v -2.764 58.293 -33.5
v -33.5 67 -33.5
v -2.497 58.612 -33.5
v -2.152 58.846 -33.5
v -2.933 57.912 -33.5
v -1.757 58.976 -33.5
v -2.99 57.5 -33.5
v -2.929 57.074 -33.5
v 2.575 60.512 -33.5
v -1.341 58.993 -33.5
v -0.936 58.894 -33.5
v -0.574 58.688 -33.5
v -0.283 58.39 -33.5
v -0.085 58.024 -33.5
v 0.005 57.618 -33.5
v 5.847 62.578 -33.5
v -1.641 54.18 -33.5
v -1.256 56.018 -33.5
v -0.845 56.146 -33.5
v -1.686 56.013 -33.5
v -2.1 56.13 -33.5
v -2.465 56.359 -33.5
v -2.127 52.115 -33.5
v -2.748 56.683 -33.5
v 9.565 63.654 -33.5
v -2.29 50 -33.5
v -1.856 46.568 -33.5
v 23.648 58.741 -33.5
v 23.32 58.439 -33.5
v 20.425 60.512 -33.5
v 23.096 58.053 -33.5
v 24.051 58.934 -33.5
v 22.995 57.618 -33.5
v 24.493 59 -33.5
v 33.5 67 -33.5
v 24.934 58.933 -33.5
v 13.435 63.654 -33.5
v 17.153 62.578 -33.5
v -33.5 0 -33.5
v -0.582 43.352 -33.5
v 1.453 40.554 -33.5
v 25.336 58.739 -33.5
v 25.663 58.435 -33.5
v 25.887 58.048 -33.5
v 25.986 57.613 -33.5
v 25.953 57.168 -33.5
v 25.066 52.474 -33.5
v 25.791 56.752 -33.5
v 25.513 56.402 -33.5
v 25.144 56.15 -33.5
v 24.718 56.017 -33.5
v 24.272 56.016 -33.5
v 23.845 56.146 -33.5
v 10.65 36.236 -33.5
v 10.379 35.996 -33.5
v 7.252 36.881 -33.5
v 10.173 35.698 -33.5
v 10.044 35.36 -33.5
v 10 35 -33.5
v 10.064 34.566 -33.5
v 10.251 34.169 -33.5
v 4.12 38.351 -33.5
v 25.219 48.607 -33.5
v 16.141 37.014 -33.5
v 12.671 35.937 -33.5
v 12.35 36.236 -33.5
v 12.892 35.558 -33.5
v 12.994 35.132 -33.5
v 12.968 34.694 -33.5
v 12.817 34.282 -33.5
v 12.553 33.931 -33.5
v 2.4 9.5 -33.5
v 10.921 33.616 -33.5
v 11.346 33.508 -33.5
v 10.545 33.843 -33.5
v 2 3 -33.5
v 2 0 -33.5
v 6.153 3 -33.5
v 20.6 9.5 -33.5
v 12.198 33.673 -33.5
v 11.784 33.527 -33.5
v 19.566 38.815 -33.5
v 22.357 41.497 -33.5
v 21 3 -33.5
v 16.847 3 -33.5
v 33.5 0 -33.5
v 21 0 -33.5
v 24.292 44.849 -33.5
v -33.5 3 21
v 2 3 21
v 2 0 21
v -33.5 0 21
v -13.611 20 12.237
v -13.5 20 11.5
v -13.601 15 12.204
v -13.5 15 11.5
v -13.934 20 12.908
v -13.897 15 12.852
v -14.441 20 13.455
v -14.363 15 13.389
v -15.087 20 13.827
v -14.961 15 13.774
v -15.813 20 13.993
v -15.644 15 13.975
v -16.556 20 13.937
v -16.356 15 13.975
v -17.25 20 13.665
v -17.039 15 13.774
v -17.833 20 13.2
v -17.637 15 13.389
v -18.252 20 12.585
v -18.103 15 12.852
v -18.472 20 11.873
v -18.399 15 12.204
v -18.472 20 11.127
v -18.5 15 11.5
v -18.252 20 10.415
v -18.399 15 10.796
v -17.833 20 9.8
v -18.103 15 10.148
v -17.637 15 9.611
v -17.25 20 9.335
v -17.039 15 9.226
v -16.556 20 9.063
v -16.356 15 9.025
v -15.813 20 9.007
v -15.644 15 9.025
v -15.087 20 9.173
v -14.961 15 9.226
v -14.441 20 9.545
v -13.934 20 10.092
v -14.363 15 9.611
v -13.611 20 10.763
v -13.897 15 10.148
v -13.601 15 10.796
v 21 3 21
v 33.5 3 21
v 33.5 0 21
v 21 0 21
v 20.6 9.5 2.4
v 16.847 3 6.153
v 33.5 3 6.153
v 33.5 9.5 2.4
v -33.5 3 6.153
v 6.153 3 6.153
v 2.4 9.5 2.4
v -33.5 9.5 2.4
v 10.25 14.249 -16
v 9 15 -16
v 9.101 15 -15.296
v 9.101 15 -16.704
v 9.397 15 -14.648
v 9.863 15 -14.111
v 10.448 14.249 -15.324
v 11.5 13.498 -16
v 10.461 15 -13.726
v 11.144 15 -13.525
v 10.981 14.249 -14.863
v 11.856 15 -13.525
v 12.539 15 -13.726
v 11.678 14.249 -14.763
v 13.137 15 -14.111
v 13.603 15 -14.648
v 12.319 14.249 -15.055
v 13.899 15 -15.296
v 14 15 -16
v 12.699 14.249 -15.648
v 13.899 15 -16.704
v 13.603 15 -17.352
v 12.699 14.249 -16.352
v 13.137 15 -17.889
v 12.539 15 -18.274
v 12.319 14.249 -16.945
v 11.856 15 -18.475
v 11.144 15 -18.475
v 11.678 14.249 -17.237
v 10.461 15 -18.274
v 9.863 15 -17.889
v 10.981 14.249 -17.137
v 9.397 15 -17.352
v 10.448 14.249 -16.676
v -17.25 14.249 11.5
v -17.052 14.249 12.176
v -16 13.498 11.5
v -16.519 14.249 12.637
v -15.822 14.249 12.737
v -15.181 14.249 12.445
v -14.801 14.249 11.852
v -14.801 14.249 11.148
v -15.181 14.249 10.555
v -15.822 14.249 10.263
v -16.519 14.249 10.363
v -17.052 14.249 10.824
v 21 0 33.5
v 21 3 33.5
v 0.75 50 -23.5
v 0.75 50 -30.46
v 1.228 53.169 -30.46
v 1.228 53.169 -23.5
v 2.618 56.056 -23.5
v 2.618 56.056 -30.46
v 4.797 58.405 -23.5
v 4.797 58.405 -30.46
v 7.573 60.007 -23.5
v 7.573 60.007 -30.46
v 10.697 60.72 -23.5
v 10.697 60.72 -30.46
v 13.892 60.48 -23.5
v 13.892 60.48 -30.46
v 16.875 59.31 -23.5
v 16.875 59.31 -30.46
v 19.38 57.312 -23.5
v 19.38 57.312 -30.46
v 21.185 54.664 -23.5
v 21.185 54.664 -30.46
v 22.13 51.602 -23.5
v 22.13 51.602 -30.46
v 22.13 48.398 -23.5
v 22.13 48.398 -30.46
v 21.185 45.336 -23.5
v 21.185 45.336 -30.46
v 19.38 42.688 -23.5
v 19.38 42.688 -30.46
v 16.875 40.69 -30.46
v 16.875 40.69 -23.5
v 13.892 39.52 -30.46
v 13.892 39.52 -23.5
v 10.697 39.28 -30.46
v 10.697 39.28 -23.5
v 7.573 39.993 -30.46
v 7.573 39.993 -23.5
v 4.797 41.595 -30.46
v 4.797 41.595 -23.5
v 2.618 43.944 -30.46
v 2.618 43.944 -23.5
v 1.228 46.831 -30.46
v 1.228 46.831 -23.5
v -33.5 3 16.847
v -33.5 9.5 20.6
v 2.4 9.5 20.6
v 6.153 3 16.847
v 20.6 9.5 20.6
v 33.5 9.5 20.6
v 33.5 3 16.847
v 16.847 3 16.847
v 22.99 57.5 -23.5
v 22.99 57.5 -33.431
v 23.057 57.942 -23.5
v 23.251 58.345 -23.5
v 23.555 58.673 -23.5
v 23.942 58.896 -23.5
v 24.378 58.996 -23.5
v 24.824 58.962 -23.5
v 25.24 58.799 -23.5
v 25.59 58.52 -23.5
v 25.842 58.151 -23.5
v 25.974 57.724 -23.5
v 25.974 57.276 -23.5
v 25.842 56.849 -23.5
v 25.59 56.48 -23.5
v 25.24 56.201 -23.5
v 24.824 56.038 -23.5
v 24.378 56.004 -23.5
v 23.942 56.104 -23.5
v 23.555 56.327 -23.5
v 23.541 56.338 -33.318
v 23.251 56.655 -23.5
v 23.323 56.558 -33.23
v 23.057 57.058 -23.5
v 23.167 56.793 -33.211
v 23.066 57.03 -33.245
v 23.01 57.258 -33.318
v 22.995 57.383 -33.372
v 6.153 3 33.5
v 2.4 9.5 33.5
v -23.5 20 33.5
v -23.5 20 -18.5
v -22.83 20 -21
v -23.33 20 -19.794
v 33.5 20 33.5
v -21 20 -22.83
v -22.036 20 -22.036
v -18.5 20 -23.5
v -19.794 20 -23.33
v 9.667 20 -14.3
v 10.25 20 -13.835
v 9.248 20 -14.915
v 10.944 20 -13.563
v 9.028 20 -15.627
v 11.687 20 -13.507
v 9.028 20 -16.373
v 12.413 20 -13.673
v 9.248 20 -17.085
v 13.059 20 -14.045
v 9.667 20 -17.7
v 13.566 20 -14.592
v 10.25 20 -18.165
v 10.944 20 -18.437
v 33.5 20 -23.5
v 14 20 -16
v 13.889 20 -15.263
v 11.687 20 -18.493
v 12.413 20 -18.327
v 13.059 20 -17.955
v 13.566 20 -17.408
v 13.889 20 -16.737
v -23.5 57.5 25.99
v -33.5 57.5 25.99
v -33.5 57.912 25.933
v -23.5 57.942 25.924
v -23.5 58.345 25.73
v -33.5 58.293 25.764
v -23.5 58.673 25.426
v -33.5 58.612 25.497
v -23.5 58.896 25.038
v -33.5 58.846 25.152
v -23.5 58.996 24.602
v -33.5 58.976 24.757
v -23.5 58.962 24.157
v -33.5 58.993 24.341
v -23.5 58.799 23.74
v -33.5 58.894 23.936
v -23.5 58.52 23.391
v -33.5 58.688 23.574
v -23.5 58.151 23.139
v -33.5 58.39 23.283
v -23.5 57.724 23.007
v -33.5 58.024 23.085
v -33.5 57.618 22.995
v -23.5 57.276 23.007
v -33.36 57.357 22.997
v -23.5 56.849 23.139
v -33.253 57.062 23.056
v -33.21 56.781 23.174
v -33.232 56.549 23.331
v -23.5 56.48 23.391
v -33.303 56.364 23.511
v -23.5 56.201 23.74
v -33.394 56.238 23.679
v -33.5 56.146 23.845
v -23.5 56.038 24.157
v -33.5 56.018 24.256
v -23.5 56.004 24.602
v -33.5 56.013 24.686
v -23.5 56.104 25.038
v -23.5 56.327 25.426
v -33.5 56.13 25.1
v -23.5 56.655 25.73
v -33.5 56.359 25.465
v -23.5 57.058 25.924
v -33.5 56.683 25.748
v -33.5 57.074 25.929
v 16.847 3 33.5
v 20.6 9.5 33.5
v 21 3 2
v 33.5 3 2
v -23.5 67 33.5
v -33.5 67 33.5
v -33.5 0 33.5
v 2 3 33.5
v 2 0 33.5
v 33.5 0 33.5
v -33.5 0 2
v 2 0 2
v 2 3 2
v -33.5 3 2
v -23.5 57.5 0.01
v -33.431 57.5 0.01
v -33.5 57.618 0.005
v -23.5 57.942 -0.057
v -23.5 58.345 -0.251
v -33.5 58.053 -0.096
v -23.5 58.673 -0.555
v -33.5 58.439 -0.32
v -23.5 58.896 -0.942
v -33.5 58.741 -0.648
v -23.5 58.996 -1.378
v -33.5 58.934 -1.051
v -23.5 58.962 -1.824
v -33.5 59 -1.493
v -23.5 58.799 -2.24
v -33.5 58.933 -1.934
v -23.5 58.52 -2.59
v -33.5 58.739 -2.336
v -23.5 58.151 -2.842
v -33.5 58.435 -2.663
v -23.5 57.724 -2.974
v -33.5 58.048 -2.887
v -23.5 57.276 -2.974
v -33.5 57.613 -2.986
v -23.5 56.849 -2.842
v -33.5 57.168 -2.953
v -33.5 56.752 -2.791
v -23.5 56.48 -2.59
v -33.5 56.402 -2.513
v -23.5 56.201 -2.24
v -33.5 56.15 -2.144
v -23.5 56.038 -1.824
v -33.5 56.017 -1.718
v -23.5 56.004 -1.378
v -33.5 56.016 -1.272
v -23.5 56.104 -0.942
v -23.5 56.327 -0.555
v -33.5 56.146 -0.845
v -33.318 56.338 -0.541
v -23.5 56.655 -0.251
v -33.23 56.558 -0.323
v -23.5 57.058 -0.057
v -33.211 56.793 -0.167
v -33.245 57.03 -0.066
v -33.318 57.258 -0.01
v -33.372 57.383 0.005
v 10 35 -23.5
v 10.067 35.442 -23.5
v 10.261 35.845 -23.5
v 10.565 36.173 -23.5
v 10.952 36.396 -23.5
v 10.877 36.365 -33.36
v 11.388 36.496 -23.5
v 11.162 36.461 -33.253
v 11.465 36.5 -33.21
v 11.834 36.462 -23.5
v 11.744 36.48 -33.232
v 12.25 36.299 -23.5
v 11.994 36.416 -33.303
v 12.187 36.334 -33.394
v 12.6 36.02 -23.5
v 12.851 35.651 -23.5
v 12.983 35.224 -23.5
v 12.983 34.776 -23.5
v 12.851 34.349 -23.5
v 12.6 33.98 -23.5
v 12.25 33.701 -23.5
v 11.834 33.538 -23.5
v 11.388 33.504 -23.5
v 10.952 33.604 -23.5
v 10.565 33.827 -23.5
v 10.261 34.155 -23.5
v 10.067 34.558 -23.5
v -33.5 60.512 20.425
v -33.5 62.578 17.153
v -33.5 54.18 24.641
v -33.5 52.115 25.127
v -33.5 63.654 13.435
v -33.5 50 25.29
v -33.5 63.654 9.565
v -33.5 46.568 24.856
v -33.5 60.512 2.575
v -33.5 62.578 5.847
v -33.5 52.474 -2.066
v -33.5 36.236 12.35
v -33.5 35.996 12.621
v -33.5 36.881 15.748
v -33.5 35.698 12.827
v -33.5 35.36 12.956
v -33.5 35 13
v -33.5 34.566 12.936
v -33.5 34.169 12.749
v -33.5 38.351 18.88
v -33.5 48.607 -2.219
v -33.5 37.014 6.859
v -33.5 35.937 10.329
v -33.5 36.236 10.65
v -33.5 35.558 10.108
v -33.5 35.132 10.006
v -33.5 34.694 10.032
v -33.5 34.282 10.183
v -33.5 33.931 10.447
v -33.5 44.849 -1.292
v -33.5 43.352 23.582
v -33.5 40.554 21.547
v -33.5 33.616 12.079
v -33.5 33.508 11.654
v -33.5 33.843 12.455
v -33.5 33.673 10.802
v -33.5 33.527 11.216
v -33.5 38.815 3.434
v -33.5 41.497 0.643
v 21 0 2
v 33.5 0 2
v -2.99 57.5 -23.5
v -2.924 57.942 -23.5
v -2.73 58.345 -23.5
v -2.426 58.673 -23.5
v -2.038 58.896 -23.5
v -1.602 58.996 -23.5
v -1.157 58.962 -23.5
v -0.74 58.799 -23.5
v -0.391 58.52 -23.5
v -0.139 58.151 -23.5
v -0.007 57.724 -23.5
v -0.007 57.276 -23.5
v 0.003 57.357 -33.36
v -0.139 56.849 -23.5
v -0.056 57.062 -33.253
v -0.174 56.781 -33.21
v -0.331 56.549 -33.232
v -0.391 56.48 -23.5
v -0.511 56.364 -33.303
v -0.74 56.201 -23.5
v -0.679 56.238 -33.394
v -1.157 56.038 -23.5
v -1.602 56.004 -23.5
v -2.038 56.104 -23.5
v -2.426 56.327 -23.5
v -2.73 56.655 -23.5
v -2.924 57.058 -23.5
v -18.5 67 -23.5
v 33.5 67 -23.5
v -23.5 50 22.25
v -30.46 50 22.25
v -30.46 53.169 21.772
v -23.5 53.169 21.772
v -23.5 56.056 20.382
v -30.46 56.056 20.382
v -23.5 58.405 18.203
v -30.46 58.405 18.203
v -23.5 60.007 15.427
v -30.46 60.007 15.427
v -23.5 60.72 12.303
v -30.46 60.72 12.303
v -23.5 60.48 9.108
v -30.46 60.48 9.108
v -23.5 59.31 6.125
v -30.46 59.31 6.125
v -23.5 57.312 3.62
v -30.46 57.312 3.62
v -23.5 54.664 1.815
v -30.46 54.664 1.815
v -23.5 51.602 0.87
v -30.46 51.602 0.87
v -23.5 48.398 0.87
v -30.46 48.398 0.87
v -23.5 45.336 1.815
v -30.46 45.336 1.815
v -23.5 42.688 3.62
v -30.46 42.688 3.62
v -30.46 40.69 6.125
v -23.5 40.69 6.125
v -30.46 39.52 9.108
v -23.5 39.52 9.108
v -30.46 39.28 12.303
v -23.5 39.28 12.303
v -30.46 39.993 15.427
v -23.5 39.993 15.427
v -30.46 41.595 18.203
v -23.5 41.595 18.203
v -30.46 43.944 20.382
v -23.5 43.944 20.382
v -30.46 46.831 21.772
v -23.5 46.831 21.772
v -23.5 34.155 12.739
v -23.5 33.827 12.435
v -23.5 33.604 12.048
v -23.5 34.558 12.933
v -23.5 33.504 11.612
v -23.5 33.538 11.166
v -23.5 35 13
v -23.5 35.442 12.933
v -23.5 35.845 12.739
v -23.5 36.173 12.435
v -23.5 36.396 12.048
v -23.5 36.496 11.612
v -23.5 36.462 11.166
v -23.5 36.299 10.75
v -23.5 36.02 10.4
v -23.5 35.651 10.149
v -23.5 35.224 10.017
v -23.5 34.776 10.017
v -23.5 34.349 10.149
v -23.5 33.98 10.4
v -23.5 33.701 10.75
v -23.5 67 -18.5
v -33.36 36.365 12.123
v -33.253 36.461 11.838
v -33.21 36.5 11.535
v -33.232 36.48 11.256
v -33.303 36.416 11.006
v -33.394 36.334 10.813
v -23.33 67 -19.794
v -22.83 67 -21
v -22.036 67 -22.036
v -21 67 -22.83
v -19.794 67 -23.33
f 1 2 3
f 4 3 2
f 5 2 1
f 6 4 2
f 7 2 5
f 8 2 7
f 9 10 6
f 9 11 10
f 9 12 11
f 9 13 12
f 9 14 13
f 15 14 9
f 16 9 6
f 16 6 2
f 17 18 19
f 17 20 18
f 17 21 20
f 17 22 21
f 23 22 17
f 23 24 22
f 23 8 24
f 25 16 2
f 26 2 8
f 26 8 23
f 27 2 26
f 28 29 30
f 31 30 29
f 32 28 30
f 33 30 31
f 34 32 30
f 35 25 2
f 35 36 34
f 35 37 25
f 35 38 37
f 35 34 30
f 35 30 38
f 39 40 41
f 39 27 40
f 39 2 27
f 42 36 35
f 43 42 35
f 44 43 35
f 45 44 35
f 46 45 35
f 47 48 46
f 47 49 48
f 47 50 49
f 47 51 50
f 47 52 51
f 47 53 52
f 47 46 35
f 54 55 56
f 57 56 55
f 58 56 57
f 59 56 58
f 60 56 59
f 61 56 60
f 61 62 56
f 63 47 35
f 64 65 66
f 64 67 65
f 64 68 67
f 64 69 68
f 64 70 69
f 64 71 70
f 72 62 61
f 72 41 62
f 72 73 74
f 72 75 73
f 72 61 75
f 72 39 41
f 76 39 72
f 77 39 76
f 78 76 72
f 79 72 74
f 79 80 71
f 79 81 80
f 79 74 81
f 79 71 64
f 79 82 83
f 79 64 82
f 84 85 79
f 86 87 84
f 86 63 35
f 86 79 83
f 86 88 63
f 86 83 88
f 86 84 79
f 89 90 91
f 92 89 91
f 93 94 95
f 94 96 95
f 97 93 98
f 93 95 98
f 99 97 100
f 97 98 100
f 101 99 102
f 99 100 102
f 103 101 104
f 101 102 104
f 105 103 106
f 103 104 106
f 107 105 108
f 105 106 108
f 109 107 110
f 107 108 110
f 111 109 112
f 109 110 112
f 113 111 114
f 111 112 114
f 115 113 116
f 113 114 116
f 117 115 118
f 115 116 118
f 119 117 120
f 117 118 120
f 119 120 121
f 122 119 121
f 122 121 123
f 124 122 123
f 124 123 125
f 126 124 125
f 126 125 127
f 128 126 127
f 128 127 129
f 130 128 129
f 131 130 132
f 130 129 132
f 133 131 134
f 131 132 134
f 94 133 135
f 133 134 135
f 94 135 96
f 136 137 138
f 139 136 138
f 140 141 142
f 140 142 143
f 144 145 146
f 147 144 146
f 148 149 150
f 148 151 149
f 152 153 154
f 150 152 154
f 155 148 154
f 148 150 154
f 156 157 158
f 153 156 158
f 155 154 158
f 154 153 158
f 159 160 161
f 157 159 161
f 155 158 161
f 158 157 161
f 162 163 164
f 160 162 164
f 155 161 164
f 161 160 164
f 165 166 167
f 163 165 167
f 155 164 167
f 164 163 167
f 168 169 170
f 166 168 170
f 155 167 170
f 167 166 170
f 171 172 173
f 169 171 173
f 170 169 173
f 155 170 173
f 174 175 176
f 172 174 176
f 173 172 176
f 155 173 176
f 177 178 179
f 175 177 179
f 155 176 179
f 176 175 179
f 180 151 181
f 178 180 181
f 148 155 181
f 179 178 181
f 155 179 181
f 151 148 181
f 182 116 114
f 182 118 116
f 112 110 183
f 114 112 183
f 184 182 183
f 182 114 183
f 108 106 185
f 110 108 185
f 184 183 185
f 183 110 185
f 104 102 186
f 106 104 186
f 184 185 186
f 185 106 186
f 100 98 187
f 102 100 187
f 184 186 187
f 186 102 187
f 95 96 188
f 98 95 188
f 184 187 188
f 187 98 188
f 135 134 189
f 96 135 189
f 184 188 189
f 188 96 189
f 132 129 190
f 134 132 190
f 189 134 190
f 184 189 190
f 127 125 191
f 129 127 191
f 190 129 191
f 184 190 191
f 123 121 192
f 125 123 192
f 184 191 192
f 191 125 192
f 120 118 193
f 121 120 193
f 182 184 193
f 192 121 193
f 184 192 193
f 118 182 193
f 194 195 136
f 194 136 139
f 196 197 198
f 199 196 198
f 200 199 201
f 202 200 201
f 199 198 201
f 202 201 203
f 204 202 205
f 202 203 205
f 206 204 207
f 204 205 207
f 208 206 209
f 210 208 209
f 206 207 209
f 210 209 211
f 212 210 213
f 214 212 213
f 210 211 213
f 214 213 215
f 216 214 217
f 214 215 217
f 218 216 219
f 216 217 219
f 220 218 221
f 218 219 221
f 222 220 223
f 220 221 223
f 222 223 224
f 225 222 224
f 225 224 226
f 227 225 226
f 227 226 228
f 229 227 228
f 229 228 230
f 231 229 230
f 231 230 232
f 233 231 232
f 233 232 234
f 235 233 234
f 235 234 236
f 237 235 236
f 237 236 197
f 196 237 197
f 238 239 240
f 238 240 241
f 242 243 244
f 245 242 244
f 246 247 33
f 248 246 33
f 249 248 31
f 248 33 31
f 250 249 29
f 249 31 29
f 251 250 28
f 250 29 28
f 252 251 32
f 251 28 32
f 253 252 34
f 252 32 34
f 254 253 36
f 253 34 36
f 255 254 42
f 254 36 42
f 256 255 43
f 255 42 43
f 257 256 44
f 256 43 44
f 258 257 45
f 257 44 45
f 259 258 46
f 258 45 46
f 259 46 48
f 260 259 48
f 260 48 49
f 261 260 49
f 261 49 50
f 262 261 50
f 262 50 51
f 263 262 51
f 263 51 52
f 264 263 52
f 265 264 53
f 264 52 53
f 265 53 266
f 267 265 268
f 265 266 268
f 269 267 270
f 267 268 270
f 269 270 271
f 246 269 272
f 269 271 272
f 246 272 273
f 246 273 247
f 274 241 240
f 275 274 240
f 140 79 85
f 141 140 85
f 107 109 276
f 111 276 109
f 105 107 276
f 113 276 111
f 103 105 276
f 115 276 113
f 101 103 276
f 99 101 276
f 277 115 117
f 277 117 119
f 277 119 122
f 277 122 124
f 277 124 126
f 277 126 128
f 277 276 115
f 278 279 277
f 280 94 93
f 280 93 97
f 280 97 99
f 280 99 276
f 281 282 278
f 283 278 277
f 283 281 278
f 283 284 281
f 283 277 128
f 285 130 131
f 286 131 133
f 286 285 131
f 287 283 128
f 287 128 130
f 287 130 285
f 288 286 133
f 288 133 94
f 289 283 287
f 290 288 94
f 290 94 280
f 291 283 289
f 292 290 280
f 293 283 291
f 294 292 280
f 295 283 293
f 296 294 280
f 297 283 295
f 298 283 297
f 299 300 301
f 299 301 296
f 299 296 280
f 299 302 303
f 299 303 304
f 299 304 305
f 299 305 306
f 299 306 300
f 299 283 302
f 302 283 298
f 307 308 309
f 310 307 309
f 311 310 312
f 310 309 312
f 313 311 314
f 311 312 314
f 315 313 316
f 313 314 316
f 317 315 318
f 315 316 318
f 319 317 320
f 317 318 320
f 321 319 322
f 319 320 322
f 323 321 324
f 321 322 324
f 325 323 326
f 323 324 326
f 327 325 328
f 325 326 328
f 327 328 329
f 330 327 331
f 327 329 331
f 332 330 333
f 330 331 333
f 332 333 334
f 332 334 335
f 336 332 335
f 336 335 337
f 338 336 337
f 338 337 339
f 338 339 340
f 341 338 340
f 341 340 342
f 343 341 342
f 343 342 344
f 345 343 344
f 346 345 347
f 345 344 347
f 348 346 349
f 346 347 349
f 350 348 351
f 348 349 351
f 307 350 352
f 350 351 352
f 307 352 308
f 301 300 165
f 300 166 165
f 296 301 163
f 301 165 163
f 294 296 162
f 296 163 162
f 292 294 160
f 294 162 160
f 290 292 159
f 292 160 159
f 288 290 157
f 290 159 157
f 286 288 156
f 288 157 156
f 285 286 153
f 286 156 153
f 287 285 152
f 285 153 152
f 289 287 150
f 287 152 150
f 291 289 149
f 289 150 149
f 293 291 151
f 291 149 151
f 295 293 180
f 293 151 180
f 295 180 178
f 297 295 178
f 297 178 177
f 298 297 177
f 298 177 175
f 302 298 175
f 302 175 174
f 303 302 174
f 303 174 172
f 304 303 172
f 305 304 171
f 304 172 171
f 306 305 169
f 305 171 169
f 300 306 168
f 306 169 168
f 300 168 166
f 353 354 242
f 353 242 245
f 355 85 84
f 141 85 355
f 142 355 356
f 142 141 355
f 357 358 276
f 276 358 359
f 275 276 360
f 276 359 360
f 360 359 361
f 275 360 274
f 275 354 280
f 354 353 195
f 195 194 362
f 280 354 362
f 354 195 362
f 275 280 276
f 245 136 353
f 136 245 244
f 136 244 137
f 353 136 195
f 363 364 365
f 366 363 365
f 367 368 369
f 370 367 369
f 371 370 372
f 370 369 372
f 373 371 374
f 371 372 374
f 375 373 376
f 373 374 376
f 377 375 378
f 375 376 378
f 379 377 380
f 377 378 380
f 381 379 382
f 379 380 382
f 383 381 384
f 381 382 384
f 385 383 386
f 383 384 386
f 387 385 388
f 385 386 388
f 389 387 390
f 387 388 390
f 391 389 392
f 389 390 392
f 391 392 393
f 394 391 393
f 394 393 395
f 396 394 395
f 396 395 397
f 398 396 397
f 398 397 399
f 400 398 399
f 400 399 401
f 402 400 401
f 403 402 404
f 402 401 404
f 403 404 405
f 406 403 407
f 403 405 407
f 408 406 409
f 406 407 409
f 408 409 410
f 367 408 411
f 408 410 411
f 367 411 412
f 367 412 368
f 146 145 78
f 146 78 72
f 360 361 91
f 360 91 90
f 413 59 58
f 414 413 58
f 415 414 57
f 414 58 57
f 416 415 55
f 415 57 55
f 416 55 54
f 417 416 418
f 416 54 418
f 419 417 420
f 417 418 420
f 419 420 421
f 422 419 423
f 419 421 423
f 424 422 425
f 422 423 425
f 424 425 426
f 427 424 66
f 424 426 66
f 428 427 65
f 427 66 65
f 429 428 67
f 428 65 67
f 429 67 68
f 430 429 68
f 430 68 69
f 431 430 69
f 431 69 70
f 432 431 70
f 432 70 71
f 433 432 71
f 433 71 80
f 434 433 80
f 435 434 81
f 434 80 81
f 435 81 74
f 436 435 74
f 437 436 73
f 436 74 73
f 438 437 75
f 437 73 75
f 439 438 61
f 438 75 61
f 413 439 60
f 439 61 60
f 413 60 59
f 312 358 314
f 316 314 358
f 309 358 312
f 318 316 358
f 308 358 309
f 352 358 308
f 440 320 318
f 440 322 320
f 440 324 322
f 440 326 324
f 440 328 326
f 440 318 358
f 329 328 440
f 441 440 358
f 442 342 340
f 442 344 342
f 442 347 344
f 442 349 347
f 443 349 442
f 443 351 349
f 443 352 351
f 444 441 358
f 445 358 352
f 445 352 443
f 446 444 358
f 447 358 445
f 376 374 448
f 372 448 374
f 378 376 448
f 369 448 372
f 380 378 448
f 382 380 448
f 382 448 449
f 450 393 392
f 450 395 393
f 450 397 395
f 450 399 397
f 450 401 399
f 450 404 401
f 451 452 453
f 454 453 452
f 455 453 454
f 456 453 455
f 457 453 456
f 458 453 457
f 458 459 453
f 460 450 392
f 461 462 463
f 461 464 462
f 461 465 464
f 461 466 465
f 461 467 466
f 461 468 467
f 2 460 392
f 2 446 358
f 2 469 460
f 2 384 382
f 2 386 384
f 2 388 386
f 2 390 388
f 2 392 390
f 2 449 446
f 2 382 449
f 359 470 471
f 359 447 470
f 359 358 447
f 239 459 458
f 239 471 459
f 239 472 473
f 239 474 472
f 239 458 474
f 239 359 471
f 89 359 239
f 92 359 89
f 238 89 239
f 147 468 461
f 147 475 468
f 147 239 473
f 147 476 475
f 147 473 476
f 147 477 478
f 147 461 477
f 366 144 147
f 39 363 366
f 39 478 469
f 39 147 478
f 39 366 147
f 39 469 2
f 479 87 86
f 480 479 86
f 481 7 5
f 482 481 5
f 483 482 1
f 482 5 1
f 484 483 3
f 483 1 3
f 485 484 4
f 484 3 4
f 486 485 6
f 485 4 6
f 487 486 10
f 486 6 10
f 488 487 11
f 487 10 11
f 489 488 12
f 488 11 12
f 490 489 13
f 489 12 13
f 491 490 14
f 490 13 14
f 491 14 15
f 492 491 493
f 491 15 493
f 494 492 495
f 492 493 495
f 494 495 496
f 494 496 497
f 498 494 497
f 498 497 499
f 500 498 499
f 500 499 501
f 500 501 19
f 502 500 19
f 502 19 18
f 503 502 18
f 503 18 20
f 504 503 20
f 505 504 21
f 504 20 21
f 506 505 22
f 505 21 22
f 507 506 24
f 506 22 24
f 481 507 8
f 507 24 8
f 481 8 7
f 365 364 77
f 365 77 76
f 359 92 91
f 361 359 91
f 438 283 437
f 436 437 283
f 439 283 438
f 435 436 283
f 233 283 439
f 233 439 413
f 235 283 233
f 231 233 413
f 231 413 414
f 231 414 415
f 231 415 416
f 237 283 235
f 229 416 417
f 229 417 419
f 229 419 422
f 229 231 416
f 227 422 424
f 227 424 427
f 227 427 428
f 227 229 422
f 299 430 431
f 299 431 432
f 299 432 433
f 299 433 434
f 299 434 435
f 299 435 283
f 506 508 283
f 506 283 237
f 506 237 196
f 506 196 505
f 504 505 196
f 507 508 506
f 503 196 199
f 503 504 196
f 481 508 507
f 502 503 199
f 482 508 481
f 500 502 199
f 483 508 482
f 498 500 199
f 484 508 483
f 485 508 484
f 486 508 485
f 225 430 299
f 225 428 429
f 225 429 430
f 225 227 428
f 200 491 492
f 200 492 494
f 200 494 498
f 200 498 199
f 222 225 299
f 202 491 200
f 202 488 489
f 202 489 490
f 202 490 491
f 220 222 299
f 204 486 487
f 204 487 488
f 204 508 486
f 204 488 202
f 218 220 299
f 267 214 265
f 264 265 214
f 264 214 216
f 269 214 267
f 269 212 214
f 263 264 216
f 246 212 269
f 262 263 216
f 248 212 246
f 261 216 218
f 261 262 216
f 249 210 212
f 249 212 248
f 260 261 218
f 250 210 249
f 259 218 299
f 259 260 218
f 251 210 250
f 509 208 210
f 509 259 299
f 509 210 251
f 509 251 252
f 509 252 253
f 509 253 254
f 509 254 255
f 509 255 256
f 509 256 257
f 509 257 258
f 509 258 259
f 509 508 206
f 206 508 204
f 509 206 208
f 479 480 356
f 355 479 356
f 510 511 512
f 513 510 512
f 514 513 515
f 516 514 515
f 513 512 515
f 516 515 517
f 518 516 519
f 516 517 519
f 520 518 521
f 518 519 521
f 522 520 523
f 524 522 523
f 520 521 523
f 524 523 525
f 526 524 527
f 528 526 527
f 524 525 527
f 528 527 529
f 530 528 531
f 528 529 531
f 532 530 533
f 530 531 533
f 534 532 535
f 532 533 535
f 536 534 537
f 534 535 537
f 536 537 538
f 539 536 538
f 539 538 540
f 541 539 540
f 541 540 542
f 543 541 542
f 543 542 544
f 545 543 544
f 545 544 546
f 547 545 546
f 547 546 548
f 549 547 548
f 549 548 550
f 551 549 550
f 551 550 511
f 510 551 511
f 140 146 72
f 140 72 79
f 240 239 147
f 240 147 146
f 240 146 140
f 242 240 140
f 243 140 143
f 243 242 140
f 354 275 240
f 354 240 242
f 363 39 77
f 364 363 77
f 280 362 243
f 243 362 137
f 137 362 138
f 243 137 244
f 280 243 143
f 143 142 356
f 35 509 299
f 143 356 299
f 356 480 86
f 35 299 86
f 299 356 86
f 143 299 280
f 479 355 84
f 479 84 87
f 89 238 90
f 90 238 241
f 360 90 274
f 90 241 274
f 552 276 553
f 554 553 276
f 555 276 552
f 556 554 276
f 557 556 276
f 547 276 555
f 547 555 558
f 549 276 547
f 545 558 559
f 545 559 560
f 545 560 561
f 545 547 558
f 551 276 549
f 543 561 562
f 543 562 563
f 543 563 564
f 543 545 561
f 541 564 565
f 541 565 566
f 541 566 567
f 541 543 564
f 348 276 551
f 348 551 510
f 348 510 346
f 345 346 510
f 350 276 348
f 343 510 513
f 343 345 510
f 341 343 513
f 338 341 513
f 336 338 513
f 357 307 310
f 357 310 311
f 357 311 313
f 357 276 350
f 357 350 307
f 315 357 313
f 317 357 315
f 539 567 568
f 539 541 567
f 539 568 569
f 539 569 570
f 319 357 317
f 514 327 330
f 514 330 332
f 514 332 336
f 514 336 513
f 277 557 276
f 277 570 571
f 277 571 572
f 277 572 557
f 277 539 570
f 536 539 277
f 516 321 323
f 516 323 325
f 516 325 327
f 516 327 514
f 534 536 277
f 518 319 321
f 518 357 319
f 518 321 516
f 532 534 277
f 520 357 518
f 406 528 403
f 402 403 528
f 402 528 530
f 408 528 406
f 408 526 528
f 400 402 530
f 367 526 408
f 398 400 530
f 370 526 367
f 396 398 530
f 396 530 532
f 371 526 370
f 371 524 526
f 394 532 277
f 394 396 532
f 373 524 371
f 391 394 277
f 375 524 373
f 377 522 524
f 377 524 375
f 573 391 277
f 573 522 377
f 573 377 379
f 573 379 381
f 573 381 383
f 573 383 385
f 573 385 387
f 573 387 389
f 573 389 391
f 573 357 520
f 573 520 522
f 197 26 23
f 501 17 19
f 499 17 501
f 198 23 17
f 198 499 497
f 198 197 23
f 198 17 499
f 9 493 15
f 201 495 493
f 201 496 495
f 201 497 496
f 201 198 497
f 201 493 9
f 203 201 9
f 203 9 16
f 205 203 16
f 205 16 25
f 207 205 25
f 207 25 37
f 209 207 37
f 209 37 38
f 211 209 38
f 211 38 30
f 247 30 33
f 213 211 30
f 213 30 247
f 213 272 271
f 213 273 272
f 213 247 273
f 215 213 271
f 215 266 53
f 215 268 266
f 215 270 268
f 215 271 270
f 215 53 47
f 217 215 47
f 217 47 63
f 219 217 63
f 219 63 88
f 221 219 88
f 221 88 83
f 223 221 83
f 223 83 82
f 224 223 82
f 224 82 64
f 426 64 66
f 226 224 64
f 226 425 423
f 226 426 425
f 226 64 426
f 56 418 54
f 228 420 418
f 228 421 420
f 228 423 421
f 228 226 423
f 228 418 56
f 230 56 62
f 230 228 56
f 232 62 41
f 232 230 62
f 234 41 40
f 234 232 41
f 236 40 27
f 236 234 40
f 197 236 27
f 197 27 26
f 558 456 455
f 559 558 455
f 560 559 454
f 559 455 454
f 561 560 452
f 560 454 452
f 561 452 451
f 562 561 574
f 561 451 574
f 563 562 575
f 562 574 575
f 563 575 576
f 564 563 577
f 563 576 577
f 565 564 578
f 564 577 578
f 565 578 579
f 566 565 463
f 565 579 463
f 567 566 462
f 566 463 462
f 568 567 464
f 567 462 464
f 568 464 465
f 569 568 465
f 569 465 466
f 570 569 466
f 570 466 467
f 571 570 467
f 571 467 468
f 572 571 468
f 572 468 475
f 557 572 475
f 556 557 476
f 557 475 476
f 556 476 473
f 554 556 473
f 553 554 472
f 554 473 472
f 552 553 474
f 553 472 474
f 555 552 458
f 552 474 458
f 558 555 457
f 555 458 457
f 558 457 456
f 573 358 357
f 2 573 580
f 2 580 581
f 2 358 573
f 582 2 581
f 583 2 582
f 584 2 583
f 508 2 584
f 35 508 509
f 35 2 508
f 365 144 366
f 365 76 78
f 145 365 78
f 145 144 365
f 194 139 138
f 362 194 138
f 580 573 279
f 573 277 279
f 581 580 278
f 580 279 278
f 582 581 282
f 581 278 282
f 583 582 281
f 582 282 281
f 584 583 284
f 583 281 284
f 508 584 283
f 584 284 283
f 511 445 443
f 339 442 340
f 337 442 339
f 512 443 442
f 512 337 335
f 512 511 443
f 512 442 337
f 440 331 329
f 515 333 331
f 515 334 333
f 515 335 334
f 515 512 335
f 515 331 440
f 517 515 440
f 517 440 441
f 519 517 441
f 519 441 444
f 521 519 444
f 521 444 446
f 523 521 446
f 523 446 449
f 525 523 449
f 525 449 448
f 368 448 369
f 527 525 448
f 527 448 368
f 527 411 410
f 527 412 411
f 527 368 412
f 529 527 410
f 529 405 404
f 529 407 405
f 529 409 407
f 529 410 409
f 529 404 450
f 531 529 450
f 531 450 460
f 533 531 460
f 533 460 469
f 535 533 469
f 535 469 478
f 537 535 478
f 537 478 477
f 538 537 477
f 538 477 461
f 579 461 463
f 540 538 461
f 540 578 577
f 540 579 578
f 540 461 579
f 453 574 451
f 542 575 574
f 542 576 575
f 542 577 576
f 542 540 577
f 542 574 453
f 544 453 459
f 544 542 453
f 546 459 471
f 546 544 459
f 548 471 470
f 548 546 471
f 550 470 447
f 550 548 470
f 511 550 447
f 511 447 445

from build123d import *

# Parameters (mm, degrees)
SKETCH1_W                    = 67
SKETCH1_H                    = 67
BOSS_EXTRUDE1_DEPTH          = 67
SKETCH2_W                    = 57
SKETCH2_H                    = 57
CUT_EXTRUDE1_DEPTH           = 47
CUT_EXTRUDE2_REACH           = 102.5
SKETCH3_R                    = 10.75
CUT_EXTRUDE3_REACH           = 102.5
SKETCH4_R                    = 10.75
F_5_0_5_DIAMETER_HOLE1_D     = 5
F_5_0_5_DIAMETER_HOLE1_DEPTH = 5
F_5_0_5_DIAMETER_HOLE1_TIP   = 1.502151548
FILLET1_R                    = 5
CHAMFER1_SIZE                = 3.04
CUT_EXTRUDE4_REACH           = 102.5
CUT_EXTRUDE5_DEPTH           = 101.5
SKETCH9_R                    = 1.5
CUT_EXTRUDE6_DEPTH           = 10
SKETCH10_R                   = 1.5
CUT_EXTRUDE7_DEPTH           = 10


with BuildPart() as part:
    # Sketch1 → Boss-Extrude1 (new body)
    with BuildSketch(Plane(origin=(0, 0, 0), x_dir=(1, 0, 0), z_dir=(0, 1, 0))):
        Rectangle(SKETCH1_W, SKETCH1_H)
    extrude(amount=BOSS_EXTRUDE1_DEPTH)

    # Sketch2 → Cut-Extrude1 (cut)
    with BuildSketch(Plane(origin=(0, 67, 0), x_dir=(1, 0, 0), z_dir=(0, 1, 0))):
        with Locations((5, -5)):
            Rectangle(SKETCH2_W, SKETCH2_H)
    extrude(amount=-CUT_EXTRUDE1_DEPTH, mode=Mode.SUBTRACT)

    # Sketch3 → Cut-Extrude2 (cut, up to next)
    with BuildSketch(Plane.ZY.offset(33.5), mode=Mode.PRIVATE) as cut_extrude2_sk1:
        with Locations((11.5, 50)):
            Circle(SKETCH3_R)
    cut_extrude2_tool1 = extrude(cut_extrude2_sk1.sketch, amount=-CUT_EXTRUDE2_REACH, mode=Mode.PRIVATE) & part.part
    add(cut_extrude2_tool1.solids().sort_by_distance((-33.5, 50, 11.5))[0], mode=Mode.SUBTRACT)

    # Sketch4 → Cut-Extrude3 (cut, up to next)
    with BuildSketch(Plane(origin=(0, 0, -33.5), x_dir=(-1, 0, 0), z_dir=(0, 0, -1)), mode=Mode.PRIVATE) as cut_extrude3_sk1:
        with Locations((-11.5, 50)):
            Circle(SKETCH4_R)
    cut_extrude3_tool1 = extrude(cut_extrude3_sk1.sketch, amount=-CUT_EXTRUDE3_REACH, mode=Mode.PRIVATE) & part.part
    add(cut_extrude3_tool1.solids().sort_by_distance((11.5, 50, -33.5))[0], mode=Mode.SUBTRACT)

    # Ø5.0 (5) Diameter Hole1
    with Locations(Plane(origin=(0, 20, 0), x_dir=(-1, 0, 0), z_dir=(0, 1, 0))):
        with Locations((16, 11.5), (-11.5, -16)):
            Hole(F_5_0_5_DIAMETER_HOLE1_D / 2, depth=F_5_0_5_DIAMETER_HOLE1_DEPTH)
            with Locations((0, 0, -(F_5_0_5_DIAMETER_HOLE1_DEPTH + F_5_0_5_DIAMETER_HOLE1_TIP / 2))):  # 118° drill point
                Cone(0, F_5_0_5_DIAMETER_HOLE1_D / 2, F_5_0_5_DIAMETER_HOLE1_TIP, mode=Mode.SUBTRACT)

    # Fillet1
    fillet1_edges = [part.edges().sort_by_distance(p)[0] for p in [
        (-23.5, 43.5, -23.5),
    ]]
    fillet(fillet1_edges, radius=FILLET1_R)

    # Chamfer1
    chamfer1_edges = [part.edges().sort_by_distance(p)[0] for p in [
        (-33.5, 50, 0.75),
        (22.25, 50, -33.5),
    ]]
    chamfer(chamfer1_edges, length=CHAMFER1_SIZE)

    # Sketch7 → Cut-Extrude4 (cut, up to next)
    with BuildSketch(Plane(origin=(33.5, 0, 0), x_dir=(0, 0, -1), z_dir=(1, 0, 0)), mode=Mode.PRIVATE) as cut_extrude4_sk1:
        Polygon((-2.4, 9.5), (-20.6, 9.5), (-16.84722325, 3), (-21, 3), (-21, 0), (-2, 0), (-2, 3), (-6.15277675, 3), align=None)
    cut_extrude4_tool1 = extrude(cut_extrude4_sk1.sketch, amount=-CUT_EXTRUDE4_REACH, mode=Mode.PRIVATE) & part.part
    add(cut_extrude4_tool1.solids().sort_by_distance((33.5, 4.630961, 11.5))[0], mode=Mode.SUBTRACT)

    # Sketch8 → Cut-Extrude5 (cut, through all)
    with BuildSketch(Plane.XY.offset(33.5)):
        Polygon((2.4, 9.5), (20.6, 9.5), (16.84722325, 3), (21, 3), (21, 0), (2, 0), (2, 3), (6.15277675, 3), align=None)
    extrude(amount=-CUT_EXTRUDE5_DEPTH, mode=Mode.SUBTRACT)

    # Sketch9 → Cut-Extrude6 (cut)
    with BuildSketch(Plane.ZY.offset(33.5)):
        with Locations((-1.490381057, 57.5)):
            Circle(SKETCH9_R)
        with Locations((24.490381057, 57.5)):
            Circle(SKETCH9_R)
        with Locations((11.5, 35)):
            Circle(SKETCH9_R)
    extrude(amount=-CUT_EXTRUDE6_DEPTH, mode=Mode.SUBTRACT)

    # Sketch10 → Cut-Extrude7 (cut)
    with BuildSketch(Plane(origin=(0, 0, -33.5), x_dir=(-1, 0, 0), z_dir=(0, 0, -1))):
        with Locations((1.490381057, 57.5)):
            Circle(SKETCH10_R)
        with Locations((-24.490381057, 57.5)):
            Circle(SKETCH10_R)
        with Locations((-11.5, 35)):
            Circle(SKETCH10_R)
    extrude(amount=-CUT_EXTRUDE7_DEPTH, mode=Mode.SUBTRACT)


solid = part.part
